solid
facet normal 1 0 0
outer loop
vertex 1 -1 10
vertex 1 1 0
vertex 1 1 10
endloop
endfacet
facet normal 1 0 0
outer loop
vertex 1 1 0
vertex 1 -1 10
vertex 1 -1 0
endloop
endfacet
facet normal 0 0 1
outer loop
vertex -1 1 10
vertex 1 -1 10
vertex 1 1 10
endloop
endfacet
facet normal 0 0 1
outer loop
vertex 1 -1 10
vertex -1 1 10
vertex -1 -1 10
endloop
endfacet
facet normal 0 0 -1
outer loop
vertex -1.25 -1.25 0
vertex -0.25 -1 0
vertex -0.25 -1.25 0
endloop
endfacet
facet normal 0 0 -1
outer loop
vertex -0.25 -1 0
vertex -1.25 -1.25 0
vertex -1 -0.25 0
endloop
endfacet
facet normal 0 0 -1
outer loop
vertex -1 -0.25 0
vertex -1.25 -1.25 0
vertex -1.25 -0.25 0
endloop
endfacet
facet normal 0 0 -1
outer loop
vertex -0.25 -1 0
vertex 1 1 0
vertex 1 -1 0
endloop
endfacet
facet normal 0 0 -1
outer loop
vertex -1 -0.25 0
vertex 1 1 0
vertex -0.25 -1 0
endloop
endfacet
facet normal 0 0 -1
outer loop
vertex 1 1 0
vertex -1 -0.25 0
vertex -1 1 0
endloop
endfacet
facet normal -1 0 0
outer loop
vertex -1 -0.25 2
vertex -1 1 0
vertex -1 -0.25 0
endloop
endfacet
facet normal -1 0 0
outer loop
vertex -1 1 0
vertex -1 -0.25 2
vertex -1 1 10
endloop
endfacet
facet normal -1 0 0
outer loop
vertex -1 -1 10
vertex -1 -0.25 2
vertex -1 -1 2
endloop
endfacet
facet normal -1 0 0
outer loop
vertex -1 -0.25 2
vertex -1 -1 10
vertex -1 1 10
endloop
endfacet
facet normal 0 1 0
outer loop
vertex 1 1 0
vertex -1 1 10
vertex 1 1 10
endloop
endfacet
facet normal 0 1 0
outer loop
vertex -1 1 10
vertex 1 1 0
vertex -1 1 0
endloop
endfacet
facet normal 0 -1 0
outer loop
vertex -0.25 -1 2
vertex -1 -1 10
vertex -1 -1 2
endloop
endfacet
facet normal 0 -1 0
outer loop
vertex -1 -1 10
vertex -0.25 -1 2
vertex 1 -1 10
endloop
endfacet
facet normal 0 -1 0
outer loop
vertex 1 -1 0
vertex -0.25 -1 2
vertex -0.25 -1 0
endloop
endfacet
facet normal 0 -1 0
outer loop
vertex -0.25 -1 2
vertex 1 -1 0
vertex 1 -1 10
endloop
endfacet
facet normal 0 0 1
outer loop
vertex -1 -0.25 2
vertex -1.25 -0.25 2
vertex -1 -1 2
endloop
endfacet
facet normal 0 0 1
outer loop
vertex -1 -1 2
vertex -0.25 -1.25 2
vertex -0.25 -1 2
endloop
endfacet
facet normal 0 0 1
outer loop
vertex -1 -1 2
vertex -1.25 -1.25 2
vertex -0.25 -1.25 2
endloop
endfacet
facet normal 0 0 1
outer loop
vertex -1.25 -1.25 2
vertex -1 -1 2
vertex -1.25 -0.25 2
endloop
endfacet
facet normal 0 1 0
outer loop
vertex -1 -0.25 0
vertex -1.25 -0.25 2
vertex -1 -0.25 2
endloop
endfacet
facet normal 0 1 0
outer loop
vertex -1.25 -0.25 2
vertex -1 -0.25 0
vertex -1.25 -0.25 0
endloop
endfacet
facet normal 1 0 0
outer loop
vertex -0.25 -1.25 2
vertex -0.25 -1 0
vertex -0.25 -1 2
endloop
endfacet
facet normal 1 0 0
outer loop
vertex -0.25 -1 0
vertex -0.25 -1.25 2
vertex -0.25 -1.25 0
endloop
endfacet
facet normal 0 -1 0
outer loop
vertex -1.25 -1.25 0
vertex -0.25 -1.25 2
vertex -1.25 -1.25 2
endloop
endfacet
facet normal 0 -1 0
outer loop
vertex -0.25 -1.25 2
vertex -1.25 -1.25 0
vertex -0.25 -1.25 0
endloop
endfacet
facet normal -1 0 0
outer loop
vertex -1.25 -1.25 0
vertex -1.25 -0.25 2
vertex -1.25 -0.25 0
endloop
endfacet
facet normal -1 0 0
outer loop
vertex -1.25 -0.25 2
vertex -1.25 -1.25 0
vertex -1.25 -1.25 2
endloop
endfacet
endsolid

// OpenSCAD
translate([0, 0, 5]) color([0,1,0,0.9]) cube([2, 2, 10], center=true);
translate([-0.5, -0.5, 1]) color([1,0,0]) cube([0.5, 0.5, 2], center=true);
translate([-0.5, -1.0, 1]) color([1,0,0]) cube([0.5, 0.5, 2], center=true);
translate([-1.0, -0.5, 1]) color([1,0,0]) cube([0.5, 0.5, 2], center=true);
translate([-1.0, -1.0, 1]) color([1,0,0]) cube([0.5, 0.5, 2], center=true);
